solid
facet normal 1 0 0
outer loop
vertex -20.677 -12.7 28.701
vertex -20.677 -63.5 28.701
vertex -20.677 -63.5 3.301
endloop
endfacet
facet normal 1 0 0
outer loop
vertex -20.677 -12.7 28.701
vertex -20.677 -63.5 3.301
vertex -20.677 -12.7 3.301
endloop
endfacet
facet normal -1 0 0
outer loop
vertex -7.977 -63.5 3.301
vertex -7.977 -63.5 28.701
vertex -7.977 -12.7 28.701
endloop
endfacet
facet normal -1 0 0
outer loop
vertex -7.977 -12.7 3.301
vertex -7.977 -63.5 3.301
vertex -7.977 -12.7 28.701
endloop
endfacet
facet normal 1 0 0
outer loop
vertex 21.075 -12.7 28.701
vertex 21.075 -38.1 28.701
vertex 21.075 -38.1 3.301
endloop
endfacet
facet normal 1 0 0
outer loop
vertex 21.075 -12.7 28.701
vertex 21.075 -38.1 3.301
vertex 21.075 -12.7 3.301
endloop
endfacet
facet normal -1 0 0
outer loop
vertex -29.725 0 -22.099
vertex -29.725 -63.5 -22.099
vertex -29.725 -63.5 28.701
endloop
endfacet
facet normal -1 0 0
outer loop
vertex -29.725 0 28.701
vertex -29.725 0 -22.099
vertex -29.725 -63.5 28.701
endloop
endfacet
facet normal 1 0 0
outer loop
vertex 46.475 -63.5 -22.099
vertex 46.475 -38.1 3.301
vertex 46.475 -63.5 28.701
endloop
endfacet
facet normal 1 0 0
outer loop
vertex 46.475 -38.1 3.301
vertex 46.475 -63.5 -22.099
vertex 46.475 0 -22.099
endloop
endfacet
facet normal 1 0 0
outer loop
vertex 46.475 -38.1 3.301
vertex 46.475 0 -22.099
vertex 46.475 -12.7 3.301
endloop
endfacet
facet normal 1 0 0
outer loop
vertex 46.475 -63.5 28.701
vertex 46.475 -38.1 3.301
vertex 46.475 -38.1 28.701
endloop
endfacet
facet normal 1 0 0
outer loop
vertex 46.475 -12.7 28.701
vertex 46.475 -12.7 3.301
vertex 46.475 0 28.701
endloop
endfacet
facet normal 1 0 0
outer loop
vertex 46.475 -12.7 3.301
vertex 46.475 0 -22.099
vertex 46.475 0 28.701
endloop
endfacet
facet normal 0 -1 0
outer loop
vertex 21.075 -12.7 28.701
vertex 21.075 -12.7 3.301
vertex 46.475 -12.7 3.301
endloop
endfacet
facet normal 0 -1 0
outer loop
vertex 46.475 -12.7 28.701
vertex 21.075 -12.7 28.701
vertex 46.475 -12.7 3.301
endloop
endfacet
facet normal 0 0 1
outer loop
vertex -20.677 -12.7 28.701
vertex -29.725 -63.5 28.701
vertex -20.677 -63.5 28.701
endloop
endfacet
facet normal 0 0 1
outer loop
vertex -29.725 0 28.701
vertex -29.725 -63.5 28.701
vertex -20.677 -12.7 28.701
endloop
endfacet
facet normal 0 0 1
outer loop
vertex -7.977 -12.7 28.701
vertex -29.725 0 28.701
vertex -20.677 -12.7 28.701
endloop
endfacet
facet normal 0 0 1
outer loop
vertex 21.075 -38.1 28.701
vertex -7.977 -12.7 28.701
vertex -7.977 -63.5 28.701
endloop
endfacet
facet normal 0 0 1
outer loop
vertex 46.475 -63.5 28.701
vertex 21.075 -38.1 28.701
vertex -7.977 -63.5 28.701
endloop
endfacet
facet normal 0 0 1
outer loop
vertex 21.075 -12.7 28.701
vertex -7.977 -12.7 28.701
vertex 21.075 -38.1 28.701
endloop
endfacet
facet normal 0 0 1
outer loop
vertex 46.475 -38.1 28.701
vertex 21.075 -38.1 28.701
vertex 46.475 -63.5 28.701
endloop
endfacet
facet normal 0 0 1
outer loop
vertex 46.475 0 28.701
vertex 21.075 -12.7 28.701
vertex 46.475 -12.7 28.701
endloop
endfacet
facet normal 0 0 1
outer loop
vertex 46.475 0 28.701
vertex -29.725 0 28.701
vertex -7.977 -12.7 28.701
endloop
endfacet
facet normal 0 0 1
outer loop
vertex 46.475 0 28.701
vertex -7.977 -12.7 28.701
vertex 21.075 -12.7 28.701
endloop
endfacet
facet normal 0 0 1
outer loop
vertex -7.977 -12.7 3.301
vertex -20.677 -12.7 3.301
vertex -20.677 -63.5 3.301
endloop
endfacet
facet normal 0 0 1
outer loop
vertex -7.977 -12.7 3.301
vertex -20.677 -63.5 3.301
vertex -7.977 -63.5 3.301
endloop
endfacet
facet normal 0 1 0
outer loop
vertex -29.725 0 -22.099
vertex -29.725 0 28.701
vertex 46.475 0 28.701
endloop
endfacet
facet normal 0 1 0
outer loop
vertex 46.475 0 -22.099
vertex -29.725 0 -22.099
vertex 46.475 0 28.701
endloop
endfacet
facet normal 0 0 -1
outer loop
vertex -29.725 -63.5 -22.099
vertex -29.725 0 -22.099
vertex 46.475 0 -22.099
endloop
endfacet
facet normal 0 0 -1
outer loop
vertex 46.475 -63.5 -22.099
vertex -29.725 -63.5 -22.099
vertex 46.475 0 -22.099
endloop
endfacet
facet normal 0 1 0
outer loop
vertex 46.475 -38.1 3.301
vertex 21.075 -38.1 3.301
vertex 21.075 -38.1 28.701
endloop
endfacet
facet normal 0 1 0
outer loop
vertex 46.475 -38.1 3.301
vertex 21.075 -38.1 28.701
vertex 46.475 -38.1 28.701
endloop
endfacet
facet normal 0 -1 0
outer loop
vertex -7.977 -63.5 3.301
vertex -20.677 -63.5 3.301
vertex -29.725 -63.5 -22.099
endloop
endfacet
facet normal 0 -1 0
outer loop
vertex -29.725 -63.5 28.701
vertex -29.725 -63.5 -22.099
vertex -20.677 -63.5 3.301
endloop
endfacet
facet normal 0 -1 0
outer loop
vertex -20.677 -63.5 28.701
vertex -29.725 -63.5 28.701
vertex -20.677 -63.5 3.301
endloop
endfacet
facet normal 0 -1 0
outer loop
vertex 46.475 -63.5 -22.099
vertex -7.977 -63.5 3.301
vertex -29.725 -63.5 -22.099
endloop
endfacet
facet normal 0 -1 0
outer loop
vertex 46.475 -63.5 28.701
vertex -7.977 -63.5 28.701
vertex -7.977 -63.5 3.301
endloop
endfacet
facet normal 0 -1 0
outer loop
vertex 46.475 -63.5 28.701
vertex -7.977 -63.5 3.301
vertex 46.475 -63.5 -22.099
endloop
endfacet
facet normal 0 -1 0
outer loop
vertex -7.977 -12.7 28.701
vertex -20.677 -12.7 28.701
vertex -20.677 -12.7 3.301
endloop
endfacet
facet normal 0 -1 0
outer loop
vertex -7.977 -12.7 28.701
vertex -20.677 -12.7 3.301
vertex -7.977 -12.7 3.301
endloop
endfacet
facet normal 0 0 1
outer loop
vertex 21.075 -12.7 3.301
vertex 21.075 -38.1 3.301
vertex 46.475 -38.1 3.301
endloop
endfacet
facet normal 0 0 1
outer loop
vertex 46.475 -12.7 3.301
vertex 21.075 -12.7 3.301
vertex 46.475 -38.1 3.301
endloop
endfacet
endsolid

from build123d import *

# Parameters (mm, degrees)
F0_W     = 76.2
F0_H     = 50.8
F1_DEPTH = 63.5
F2_W     = 12.7
F2_H     = 50.8
F3_DEPTH = 25.4
F4_W     = 25.4
F4_H     = 25.4
F5_DEPTH = 25.4


with BuildPart() as f1:
    # F0 (on Front) → F1 (new body)
    with BuildSketch(Plane.XZ):
        with Locations((8.374921, 3.300743)):
            Rectangle(F0_W, F0_H)
    extrude(amount=F1_DEPTH)

    # F2 (on face) → F3 (cut)
    with BuildSketch(Plane.XY.offset(28.700743)):
        with Locations((-14.327138, -38.1)):
            Rectangle(F2_W, F2_H)
    extrude(amount=-F3_DEPTH, mode=Mode.SUBTRACT)

    # F4 (on face) → F5 (cut)
    with BuildSketch(Plane.XY.offset(28.700743)):
        with Locations((33.774921, -25.4)):
            Rectangle(F4_W, F4_H)
    extrude(amount=-F5_DEPTH, mode=Mode.SUBTRACT)


solid = f1.part
